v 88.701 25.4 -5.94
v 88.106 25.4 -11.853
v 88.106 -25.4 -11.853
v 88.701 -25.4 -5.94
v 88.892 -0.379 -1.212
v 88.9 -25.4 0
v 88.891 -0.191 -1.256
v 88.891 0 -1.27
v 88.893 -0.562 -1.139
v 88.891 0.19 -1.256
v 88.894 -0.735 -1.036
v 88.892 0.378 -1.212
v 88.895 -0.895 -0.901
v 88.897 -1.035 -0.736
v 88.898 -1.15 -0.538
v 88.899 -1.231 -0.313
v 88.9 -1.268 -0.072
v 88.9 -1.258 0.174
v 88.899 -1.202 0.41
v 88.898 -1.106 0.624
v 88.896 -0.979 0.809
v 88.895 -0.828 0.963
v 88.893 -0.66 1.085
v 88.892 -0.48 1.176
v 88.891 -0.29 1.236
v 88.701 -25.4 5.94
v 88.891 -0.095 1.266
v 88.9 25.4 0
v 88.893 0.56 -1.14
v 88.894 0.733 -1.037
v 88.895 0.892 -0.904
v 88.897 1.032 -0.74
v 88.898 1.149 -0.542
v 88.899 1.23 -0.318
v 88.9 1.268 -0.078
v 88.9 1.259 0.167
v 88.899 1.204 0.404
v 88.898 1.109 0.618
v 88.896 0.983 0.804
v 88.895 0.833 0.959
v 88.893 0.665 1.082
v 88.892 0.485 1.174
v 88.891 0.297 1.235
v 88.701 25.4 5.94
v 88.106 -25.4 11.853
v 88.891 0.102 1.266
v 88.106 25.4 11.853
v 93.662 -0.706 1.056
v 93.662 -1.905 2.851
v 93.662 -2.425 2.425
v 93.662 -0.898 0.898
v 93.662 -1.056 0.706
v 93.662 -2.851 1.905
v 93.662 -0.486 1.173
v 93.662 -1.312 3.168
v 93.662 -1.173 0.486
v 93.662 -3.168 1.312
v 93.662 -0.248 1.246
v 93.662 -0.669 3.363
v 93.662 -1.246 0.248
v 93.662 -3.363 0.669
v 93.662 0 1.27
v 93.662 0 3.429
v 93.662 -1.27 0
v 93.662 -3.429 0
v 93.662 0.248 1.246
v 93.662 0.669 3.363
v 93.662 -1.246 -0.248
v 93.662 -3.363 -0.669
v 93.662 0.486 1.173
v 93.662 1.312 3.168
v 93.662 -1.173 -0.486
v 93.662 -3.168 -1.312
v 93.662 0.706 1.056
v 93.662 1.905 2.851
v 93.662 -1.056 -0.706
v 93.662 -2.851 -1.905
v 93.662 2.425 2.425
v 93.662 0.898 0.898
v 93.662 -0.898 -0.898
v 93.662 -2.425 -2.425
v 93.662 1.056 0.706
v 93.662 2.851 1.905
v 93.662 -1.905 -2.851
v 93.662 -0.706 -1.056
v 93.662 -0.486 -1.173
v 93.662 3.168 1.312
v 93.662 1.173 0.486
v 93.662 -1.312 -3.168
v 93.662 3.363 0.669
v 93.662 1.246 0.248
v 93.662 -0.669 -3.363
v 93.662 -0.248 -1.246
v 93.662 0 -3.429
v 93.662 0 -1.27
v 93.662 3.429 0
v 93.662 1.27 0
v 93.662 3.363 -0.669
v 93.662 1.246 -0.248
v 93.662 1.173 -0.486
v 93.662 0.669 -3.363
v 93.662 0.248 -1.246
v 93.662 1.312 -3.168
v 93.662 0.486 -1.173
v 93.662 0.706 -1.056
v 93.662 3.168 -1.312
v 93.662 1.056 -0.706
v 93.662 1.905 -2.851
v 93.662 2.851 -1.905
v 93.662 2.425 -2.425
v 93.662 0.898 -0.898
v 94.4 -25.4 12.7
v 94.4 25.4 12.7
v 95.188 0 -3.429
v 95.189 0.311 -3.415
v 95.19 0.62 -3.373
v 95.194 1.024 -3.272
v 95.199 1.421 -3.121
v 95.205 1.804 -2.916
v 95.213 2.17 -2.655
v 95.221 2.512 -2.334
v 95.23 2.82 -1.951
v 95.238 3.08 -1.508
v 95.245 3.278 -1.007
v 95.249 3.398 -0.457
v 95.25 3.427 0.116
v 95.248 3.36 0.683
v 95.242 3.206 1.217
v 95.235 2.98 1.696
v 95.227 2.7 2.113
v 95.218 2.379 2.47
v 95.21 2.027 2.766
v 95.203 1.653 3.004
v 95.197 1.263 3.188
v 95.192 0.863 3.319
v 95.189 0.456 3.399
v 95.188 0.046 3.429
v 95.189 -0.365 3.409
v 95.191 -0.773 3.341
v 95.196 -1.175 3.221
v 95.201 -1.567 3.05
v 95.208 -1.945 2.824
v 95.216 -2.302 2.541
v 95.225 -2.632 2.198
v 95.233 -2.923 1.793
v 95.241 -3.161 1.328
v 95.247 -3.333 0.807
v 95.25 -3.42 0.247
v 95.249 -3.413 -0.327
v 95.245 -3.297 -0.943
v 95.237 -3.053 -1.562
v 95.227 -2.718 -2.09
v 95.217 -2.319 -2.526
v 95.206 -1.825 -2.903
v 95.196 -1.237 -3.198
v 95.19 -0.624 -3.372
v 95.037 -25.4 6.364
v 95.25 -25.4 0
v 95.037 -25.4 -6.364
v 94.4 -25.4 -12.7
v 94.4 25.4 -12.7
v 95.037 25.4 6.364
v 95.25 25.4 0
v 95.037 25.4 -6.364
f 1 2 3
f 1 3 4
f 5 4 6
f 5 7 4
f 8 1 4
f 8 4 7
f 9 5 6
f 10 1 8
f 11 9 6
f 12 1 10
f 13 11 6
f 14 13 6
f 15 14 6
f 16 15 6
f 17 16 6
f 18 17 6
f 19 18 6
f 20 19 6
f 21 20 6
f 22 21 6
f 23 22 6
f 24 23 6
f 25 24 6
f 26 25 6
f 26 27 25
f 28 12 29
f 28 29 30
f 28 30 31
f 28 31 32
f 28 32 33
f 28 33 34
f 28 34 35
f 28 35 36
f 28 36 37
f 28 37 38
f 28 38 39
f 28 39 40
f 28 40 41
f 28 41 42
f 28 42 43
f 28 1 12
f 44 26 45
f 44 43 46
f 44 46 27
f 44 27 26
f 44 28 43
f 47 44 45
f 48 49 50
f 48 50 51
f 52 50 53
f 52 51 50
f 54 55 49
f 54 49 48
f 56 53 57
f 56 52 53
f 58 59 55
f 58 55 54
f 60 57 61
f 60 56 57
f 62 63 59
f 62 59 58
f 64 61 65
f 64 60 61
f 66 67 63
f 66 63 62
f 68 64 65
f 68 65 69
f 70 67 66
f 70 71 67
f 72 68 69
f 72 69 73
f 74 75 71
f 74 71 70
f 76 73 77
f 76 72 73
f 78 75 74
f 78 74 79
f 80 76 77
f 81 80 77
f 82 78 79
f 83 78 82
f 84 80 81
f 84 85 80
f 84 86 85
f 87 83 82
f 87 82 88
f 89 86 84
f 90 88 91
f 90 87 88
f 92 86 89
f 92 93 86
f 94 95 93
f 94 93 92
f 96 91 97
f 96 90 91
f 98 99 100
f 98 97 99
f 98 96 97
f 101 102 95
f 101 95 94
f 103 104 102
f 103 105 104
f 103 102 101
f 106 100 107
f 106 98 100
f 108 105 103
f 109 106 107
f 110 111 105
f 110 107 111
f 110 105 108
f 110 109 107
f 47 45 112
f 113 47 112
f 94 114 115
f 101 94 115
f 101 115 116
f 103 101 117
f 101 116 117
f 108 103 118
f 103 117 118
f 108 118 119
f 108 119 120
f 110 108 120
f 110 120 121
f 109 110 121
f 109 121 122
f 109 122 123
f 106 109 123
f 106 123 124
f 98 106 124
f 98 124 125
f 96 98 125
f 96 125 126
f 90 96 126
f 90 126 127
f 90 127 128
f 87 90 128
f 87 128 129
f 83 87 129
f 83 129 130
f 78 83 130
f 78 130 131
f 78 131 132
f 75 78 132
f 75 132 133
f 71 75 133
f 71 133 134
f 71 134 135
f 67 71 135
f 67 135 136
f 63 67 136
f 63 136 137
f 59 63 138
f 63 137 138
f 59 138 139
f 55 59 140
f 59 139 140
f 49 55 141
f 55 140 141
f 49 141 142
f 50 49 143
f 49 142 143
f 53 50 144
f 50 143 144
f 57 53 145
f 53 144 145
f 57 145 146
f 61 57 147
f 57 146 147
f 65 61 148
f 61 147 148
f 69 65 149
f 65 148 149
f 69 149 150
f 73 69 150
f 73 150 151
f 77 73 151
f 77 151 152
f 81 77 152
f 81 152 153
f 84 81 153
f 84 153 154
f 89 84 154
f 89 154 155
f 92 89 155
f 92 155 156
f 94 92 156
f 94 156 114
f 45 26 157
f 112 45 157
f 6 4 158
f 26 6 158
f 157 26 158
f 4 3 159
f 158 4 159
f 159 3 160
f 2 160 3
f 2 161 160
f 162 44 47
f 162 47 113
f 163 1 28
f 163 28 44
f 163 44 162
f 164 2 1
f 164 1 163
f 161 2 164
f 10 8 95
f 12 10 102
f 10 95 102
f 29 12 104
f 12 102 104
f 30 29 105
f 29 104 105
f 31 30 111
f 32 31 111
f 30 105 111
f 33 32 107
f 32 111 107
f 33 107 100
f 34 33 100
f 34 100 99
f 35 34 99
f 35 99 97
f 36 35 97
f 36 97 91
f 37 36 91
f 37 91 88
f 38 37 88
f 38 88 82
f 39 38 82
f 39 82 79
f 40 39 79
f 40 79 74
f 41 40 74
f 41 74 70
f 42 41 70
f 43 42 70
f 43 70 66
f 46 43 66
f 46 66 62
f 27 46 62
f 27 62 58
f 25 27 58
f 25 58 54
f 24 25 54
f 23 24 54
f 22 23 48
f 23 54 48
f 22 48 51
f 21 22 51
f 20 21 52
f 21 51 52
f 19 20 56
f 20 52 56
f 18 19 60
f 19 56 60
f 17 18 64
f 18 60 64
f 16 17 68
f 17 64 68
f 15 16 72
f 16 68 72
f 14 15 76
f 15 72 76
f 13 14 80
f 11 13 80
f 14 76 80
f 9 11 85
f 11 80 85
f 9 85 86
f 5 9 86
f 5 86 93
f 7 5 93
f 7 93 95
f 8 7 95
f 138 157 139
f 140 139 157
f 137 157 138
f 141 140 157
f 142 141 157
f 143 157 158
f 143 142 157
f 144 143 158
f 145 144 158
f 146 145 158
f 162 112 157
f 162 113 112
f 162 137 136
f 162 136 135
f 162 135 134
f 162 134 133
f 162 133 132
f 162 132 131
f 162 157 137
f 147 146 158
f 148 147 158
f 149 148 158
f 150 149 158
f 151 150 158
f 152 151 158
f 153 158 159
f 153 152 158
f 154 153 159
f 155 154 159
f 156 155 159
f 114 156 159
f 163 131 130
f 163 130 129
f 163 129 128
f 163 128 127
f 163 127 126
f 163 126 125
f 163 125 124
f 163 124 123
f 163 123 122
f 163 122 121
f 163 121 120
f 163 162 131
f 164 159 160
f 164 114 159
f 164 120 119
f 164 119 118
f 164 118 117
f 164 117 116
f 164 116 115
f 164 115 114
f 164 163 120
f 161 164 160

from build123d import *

# Parameters (mm, degrees)
BOSS_EXTRUDE1_DEPTH = 25.4
SKETCH5_R           = 3.429
CUT_EXTRUDE1_DEPTH  = 1.5875
SKETCH6_R           = 1.27
CUT_EXTRUDE2_DEPTH  = 29.93651842


with BuildPart() as part:
    # Sketch4 → Boss-Extrude1 (new, symmetric)
    with BuildSketch(Plane(origin=(0, 0, 0), x_dir=(1, 0, 0), z_dir=(0, 1, 0))):
        with BuildLine():
            Line((94.399536545, 12.7), (88.106234109, 11.853333333))
            ThreePointArc((88.106234109, 11.853333333), (88.9, 0), (88.106234109, -11.853333333))
            Line((88.106234109, -11.853333333), (94.399536545, -12.7))
            ThreePointArc((94.399536545, -12.7), (95.25, 0), (94.399536545, 12.7))
        make_face()
    extrude(amount=BOSS_EXTRUDE1_DEPTH, both=True)

    # Sketch5 → Cut-Extrude1 (cut)
    with BuildSketch(Plane(origin=(95.25, 25.4, 0), x_dir=(0, 0, -1), z_dir=(1, 0, 0))):
        with Locations((0, -25.4)):
            Circle(SKETCH5_R)
    extrude(amount=-CUT_EXTRUDE1_DEPTH, mode=Mode.SUBTRACT)

    # Sketch6 → Cut-Extrude2 (cut, through all)
    with BuildSketch(Plane(origin=(93.6625, 0, 0), x_dir=(0, 0, -1), z_dir=(1, 0, 0))):
        Circle(SKETCH6_R)
    extrude(amount=-CUT_EXTRUDE2_DEPTH, mode=Mode.SUBTRACT)


solid = part.part
